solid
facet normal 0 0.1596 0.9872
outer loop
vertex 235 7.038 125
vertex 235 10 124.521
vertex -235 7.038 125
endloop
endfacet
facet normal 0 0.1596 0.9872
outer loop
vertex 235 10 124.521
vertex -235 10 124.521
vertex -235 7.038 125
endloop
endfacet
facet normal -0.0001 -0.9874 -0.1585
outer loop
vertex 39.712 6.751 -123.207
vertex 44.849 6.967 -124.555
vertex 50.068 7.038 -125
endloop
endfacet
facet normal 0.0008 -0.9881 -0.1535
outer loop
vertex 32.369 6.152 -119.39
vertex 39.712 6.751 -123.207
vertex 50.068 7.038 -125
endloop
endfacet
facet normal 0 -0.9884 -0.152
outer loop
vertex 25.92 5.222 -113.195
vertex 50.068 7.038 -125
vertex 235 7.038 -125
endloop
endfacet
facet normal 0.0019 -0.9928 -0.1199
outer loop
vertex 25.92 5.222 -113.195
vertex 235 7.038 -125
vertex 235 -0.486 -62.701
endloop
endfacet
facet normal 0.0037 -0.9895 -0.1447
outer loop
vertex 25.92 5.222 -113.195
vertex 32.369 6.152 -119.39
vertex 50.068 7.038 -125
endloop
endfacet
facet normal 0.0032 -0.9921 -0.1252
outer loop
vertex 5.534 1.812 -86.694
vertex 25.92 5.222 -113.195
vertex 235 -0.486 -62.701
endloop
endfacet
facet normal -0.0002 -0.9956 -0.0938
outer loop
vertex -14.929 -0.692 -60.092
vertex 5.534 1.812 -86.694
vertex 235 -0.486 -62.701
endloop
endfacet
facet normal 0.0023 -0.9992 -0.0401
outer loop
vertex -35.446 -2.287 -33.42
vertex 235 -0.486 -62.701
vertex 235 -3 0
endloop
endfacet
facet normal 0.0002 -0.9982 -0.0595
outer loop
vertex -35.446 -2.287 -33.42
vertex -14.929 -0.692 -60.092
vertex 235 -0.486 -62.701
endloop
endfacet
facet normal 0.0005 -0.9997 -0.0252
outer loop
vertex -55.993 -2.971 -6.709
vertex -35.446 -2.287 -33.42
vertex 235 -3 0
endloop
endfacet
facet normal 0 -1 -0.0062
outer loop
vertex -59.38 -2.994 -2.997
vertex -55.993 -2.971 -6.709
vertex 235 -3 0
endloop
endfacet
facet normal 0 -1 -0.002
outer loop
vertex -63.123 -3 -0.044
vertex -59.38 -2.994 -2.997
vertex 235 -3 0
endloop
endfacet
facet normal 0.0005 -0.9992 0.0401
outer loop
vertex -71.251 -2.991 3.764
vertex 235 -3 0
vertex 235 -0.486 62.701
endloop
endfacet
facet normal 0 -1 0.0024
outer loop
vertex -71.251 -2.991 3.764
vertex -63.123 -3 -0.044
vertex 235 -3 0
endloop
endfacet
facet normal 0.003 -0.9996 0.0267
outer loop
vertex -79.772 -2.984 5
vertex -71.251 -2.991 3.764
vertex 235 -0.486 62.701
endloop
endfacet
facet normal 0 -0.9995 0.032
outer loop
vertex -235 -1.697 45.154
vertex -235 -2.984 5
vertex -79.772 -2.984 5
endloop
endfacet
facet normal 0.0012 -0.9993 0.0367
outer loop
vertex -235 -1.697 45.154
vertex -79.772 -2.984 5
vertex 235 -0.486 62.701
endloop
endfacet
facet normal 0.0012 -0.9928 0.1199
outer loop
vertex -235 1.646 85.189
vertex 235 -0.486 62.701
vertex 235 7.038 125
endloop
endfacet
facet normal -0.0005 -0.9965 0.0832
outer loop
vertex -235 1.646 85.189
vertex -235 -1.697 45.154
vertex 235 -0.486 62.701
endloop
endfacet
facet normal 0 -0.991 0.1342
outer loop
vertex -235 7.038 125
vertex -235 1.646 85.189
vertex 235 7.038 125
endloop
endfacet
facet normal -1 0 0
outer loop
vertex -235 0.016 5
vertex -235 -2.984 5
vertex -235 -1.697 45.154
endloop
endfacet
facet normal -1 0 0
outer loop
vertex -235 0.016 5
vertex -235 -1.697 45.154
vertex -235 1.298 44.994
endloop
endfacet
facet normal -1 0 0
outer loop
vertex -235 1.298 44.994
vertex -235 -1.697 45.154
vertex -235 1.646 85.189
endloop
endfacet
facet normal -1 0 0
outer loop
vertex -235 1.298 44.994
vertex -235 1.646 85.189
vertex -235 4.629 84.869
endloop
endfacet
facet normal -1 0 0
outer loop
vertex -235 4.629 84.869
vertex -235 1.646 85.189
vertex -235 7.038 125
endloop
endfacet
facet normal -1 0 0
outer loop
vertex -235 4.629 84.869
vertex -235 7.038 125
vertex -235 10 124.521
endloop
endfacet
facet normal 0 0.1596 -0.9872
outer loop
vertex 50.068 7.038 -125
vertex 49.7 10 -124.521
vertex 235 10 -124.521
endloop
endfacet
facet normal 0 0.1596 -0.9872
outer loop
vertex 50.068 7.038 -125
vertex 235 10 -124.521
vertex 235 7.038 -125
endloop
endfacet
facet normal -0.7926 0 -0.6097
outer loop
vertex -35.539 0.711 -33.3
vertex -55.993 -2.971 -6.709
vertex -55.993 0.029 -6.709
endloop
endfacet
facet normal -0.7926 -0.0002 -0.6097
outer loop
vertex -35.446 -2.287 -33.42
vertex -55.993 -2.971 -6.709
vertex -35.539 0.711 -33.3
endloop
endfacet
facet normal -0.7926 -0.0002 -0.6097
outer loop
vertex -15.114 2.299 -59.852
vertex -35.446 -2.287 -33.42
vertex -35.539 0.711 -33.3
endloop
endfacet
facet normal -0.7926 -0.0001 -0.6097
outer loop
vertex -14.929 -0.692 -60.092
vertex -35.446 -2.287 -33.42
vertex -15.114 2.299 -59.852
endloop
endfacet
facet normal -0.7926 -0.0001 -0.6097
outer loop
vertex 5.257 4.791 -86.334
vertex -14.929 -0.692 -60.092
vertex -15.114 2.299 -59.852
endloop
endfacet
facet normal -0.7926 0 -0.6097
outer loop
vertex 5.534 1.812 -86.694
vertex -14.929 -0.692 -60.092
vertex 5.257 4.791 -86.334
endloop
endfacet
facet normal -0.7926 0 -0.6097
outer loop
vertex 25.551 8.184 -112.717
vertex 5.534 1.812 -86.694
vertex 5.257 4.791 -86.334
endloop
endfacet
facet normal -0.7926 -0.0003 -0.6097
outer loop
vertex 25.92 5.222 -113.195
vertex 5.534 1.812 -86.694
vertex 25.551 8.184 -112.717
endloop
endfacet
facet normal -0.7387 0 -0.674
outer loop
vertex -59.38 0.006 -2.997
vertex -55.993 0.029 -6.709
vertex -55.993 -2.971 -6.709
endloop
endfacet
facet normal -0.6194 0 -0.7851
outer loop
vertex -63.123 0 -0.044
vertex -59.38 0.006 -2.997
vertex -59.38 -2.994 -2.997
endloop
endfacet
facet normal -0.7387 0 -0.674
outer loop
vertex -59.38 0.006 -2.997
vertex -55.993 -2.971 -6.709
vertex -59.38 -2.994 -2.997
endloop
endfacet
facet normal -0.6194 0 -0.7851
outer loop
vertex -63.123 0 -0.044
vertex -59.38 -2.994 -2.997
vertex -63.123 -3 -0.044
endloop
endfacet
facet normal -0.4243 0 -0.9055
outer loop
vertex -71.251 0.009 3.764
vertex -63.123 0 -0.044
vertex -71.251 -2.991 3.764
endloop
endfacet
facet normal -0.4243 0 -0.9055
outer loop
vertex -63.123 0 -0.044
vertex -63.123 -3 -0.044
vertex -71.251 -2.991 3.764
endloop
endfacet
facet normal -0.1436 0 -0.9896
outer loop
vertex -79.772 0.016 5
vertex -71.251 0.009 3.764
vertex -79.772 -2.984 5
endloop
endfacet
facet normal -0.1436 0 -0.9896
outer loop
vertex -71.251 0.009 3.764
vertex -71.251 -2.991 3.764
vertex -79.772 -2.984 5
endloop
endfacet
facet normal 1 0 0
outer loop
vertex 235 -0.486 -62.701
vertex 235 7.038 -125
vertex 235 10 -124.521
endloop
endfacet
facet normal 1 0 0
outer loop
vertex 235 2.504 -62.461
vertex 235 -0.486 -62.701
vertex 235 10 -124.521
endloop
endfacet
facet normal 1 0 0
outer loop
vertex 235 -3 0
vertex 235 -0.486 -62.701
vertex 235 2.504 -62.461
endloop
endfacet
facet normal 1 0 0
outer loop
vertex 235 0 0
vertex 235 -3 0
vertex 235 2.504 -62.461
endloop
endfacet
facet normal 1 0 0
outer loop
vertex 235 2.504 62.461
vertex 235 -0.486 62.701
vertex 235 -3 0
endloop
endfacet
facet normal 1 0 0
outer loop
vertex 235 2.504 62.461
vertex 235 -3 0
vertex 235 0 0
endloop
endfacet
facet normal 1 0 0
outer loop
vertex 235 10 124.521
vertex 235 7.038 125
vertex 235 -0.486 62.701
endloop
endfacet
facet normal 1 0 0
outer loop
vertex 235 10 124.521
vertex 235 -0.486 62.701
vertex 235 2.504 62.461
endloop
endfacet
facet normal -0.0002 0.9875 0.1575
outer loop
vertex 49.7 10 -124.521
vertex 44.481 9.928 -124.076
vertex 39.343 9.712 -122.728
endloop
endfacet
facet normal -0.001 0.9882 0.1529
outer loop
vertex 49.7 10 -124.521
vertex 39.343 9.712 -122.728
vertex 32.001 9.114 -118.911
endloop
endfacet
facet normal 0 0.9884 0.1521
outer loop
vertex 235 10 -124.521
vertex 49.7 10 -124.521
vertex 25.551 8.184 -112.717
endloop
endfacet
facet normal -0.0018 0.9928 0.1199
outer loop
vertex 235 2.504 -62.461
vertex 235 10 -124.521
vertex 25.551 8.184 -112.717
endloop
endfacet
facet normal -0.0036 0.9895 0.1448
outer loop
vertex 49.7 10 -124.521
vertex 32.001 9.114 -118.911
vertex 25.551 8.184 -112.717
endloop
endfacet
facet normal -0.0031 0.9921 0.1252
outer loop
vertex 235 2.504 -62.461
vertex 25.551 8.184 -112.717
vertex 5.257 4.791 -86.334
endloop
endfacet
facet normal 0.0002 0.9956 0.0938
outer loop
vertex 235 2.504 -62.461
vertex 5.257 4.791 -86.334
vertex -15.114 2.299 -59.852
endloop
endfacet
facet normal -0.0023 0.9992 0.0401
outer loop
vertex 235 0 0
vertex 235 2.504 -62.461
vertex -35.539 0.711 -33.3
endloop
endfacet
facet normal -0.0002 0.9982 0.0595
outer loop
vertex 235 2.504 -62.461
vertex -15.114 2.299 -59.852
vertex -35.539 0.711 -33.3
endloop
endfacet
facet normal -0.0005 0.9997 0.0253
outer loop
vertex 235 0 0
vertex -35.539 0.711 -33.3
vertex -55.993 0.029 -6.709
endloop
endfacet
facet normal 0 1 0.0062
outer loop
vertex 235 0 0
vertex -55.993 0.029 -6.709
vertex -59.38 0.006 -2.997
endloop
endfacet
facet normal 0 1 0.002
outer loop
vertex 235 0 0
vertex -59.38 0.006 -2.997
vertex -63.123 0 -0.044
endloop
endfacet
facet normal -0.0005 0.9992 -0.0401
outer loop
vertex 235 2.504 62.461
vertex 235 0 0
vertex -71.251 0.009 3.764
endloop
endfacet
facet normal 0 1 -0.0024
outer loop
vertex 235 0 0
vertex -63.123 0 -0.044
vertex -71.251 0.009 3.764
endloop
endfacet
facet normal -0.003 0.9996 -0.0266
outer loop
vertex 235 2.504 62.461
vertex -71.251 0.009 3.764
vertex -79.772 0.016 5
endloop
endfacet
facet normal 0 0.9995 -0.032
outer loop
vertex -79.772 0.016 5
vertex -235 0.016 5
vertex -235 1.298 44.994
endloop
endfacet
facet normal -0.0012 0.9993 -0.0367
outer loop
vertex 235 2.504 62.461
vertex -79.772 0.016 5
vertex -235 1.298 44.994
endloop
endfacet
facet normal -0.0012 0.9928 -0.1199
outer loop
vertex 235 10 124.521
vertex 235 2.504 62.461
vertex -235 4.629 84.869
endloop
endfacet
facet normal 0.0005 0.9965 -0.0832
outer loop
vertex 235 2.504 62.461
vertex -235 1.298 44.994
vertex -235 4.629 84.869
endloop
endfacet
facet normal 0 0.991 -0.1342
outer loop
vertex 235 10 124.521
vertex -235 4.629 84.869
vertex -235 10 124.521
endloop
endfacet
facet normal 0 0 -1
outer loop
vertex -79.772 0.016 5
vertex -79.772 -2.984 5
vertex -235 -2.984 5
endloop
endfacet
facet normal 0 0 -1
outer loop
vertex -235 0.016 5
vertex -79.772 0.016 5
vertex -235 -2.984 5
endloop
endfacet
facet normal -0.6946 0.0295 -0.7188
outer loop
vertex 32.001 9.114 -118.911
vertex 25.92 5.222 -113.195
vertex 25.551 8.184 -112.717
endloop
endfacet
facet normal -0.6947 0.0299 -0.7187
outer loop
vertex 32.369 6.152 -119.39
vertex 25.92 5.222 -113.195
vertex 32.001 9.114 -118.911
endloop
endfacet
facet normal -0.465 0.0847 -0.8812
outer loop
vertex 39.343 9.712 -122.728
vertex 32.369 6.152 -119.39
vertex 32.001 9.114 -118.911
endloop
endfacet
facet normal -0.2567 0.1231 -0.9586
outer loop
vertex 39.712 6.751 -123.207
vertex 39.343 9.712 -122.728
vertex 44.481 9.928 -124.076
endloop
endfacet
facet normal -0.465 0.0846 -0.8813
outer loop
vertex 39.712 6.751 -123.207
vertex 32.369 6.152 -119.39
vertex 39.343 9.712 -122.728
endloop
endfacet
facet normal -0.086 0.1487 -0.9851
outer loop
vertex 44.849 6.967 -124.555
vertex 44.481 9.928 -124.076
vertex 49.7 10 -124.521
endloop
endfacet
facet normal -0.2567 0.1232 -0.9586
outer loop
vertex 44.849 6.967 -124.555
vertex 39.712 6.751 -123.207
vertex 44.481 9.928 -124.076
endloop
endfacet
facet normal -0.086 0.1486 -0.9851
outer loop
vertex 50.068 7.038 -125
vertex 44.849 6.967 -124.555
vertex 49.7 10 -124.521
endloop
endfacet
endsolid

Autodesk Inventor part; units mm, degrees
ref_plane "YZ Plane" through (0, 0, 0) normal (1, 0, 0) x (0, 1, 0)
ref_plane "XZ Plane" through (0, 0, 0) normal (0, 1, 0) x (-1, 0, 0)
ref_plane "XY Plane" through (0, 0, 0) normal (0, 0, 1) x (1, 0, 0)
sketch "スケッチ1" plane through (0, 0, 0) normal (1, 0, 0) x (0, 1, 0)
  arc A0 (7.0384, 125) -> (7.0384, -125) centre (780.277, 0) ccw
  arc A1 (10, 124.5212) -> (10, -124.5212) centre (780.277, 0) ccw
  line L0 (10, 124.5212) -> (7.0384, 125)
  line L1 (10, -124.5212) -> (7.0384, -125)
  line L2 (0, -175) -> (0, 175) projected
  line L3 (10, 124.5212) -> (10, -124.5212)
  point P0 (0, 0)
  point P1 (0, 0)
  dimension "d0" = 3
  dimension "d1" = 250
  dimension "d2" = 10
extrude "押し出し1" add sketch "スケッチ1" along normal mid plane 470 contours L0 A1 L2 A0 | L2 A0 | L2 A1 L1 A0
sketch "スケッチ2" plane through (0, 0, 0) normal (0, 1, 0) x (-1, 0, 0)
  line L0 (65, 5) -> (235, 5)
  line L1 (235, -125) -> (-235, -125) projected
  line L2 (235, 124.5212) -> (235, -124.5212) projected
  line L3 (235, -124.5212) -> (-235, -124.5212) projected
  line L4 (-235, 125) -> (235, 125) projected
  line L5 (65, 5) -> (-35, -125)
  line L6 (-235, -124.5212) -> (-235, 124.5212) projected
  line L7 (235, 5) -> (235, -125)
  line L8 (-35, -125) -> (235, -125)
  point P0 (0, 0)
  dimension "d5" = 120
  dimension "d6" = 200
  dimension "d7" = 300
extrude "押し出し2" cut sketch "スケッチ2" along normal through all both and the other way through all
fillet "フィレット1" radius 30 2 edges at (-65, -1.484, 5) (34.8159, 8.5192, -124.7606)
properties part number "type7_element_base" material "CFRP"
